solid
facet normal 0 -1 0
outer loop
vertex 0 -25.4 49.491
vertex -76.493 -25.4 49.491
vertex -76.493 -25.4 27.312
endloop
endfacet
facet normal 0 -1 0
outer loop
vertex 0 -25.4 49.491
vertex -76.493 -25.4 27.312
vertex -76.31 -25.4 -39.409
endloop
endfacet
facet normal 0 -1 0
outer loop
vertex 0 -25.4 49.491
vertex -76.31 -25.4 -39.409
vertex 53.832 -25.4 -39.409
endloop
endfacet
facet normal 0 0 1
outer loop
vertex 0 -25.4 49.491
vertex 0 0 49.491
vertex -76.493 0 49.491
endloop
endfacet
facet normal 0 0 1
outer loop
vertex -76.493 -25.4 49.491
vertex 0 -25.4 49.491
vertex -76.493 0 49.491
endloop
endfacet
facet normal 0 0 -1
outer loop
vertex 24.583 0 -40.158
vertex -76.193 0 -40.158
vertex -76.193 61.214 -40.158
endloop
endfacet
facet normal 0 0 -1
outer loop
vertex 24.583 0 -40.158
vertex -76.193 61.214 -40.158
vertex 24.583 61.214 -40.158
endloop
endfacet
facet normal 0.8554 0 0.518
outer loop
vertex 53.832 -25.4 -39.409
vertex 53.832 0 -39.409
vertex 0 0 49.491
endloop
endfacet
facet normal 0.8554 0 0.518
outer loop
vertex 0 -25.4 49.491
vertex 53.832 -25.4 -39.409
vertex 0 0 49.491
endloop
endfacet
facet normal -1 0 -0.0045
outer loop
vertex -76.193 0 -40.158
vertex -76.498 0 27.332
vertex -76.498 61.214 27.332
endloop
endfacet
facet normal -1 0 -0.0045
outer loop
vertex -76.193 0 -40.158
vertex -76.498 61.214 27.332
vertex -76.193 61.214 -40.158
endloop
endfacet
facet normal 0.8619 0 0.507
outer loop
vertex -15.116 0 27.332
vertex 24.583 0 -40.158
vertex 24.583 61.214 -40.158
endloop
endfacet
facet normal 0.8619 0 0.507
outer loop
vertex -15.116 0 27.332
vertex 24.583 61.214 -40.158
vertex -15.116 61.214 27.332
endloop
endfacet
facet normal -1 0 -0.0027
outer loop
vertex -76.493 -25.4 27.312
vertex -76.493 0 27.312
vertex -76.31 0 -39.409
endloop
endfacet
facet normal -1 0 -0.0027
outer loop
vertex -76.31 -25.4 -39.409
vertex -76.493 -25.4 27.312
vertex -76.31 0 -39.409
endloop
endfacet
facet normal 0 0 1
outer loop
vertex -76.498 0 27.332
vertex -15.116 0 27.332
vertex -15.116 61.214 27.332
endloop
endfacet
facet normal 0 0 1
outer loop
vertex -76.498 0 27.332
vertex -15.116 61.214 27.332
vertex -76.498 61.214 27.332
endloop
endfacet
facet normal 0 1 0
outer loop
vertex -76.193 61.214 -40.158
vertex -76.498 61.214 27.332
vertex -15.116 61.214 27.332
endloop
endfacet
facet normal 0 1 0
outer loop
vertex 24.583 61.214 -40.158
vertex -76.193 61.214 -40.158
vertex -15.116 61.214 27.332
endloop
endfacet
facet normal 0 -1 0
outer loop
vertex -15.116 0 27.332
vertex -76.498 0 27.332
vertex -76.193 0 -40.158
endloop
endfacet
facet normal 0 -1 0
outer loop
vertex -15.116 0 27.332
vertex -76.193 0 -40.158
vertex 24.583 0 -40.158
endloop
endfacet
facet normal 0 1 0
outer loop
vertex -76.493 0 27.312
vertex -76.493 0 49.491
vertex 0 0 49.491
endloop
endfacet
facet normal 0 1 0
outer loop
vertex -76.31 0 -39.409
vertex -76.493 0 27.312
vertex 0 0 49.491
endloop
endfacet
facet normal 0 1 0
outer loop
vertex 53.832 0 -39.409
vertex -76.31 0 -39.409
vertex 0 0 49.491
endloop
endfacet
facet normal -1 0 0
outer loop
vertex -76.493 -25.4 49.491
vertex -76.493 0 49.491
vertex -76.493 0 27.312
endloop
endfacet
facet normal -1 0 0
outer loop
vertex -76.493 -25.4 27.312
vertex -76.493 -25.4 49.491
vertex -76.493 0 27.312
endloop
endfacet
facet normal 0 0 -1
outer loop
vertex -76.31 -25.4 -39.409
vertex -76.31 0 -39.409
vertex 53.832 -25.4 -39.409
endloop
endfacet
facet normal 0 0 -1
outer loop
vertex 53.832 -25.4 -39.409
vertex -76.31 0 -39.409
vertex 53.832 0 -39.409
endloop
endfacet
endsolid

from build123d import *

# Parameters (mm, degrees)
F1_DEPTH = 61.214
F3_DEPTH = 25.4


with BuildPart() as f1:
    # F0 (on Front) → F1 (new body)
    with BuildSketch(Plane.XZ):
        Polygon((-15.1163935661, 27.3316595703), (-76.4981135726, 27.3316595703), (-76.1927291751, -40.1576943696), (24.5832242072, -40.1576943696), align=None)
    extrude(amount=-F1_DEPTH)


with BuildPart() as f3:
    # F2 (on Front) → F3 (new body)
    with BuildSketch(Plane.XZ):
        Polygon((-76.4930769801, 49.4907200336), (-76.4930769801, 27.311546728), (-76.3097777963, -39.409276098), (53.8324899971, -39.409276098), (0, 49.4907200336), align=None)
    extrude(amount=F3_DEPTH)


solid = Compound([f1.part, f3.part])
